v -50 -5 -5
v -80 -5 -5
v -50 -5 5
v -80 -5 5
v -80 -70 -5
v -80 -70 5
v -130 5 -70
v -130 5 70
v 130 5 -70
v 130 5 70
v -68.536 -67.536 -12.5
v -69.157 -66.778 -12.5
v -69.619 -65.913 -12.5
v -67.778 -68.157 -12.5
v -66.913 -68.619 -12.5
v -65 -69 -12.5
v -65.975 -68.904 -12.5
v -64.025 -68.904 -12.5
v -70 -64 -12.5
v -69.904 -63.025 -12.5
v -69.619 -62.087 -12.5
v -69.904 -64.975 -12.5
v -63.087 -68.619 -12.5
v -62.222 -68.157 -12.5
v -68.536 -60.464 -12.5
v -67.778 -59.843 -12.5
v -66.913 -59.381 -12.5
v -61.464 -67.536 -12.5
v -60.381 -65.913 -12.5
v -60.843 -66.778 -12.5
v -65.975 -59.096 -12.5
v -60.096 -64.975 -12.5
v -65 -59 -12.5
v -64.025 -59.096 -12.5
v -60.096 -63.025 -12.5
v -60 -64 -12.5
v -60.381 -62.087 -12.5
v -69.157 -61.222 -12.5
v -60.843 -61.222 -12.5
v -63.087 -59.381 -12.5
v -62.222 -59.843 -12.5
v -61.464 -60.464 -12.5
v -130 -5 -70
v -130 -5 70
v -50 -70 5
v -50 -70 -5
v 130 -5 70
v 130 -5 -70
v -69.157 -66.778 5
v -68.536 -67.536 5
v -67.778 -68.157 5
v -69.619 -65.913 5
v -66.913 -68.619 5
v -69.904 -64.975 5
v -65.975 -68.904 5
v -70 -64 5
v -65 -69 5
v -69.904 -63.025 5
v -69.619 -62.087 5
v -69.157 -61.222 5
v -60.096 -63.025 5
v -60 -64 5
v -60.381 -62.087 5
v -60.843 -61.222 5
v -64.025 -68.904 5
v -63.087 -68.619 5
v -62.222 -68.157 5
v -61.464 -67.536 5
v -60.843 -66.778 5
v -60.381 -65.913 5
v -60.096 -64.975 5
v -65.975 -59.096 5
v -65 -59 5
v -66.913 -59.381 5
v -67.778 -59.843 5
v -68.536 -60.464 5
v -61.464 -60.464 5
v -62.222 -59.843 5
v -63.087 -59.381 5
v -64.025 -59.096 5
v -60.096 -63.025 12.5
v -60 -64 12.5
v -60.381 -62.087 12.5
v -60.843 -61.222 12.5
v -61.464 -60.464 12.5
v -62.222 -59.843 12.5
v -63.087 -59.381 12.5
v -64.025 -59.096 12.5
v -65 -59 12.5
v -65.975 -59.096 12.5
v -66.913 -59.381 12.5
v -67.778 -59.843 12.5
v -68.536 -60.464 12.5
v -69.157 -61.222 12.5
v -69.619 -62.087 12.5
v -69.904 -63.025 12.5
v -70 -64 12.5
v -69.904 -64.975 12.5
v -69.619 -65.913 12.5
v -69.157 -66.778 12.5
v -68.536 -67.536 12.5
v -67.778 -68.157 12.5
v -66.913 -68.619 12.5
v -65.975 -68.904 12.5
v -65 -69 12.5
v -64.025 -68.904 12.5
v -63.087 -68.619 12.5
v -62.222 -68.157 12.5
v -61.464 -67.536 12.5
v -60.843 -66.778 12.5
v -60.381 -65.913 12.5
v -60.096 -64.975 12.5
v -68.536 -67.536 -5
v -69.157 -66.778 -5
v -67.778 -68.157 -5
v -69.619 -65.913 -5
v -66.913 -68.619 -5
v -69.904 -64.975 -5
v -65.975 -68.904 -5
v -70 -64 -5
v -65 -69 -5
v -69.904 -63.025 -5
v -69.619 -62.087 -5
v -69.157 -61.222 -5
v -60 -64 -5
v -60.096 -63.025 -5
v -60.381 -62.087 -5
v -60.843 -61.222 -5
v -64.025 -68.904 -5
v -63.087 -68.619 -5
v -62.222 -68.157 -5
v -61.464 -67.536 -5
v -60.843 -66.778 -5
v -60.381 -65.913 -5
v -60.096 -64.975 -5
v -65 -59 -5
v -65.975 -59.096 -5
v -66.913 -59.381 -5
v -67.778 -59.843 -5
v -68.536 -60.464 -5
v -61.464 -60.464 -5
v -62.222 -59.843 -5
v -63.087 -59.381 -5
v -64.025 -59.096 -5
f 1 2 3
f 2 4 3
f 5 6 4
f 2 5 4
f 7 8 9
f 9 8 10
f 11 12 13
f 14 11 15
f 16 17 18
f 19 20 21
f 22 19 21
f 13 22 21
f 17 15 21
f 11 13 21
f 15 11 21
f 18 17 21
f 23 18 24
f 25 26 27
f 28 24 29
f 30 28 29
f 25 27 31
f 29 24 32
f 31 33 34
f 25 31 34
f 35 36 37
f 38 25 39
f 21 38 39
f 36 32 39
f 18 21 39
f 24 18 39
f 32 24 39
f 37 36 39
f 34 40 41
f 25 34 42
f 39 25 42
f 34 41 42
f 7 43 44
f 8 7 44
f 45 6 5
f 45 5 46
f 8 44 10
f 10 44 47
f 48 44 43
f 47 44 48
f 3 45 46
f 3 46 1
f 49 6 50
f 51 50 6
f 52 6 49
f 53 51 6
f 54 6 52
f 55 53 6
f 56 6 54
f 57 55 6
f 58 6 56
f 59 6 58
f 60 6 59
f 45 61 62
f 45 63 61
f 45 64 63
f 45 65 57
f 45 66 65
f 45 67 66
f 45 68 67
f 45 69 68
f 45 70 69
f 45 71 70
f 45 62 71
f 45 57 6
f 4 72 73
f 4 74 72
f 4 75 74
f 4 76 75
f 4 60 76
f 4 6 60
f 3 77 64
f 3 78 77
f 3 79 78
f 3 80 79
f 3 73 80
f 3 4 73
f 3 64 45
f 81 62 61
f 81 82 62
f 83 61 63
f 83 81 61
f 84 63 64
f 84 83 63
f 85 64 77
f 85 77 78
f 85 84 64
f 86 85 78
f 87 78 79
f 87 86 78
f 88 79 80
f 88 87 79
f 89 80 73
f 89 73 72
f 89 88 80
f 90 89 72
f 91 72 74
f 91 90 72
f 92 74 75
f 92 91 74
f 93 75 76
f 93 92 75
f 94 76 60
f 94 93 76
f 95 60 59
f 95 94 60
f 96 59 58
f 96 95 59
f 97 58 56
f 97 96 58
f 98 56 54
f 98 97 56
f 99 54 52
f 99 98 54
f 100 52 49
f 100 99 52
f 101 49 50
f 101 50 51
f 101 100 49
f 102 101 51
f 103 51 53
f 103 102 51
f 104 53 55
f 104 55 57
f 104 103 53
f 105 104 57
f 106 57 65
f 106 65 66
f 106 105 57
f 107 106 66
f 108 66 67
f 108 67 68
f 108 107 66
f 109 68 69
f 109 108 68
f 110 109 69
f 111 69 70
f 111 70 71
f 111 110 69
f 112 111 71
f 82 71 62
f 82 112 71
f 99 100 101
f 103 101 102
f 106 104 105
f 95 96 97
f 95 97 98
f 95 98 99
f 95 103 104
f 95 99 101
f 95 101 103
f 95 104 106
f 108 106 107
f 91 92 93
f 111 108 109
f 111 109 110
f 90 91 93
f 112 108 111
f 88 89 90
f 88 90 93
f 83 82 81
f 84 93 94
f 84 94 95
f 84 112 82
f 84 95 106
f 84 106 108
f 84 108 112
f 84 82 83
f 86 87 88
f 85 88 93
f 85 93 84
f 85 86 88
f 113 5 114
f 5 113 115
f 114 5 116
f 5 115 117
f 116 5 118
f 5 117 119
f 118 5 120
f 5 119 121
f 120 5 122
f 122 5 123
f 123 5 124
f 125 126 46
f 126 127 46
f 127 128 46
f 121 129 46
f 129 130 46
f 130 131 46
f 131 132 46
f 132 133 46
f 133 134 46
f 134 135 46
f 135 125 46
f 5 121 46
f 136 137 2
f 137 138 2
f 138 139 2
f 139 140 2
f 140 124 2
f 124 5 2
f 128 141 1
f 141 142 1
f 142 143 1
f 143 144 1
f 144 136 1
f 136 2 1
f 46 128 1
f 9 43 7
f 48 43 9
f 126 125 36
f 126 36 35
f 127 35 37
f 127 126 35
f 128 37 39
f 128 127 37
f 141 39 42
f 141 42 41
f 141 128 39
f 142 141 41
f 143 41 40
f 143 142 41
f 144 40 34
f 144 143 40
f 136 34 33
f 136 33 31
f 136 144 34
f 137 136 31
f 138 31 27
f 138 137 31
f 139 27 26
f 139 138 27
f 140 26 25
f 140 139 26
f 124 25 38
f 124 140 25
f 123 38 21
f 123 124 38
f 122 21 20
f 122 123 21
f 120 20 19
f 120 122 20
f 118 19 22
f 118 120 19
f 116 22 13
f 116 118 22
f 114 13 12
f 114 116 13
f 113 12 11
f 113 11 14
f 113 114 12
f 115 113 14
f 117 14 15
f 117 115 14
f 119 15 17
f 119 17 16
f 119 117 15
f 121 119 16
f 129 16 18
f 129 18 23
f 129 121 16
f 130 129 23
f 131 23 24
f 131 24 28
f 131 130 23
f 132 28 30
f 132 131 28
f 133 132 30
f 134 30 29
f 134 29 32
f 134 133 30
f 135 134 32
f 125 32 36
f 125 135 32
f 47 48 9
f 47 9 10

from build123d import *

# Parameters (mm, degrees)
F0_W     = 260
F0_H     = 140
F1_DEPTH = 5
F2_W     = 30
F2_H     = 65
F2_R     = 5
F3_DEPTH = 5
F4_DEPTH = 12.5


with BuildPart() as f1:
    # F0 (on Front) → F1 (new body, symmetric)
    with BuildSketch(Plane.XZ):
        Rectangle(F0_W, F0_H)
    extrude(amount=F1_DEPTH, both=True)


with BuildPart() as f3:
    # F2 (on Top) → F3 (new body, symmetric)
    with BuildSketch(Plane.XY):
        with Locations((-65, -37.5)):
            Rectangle(F2_W, F2_H)
        with Locations((-65, -64)):
            Circle(F2_R, mode=Mode.SUBTRACT)
    extrude(amount=F3_DEPTH, both=True)

    # F2 (on Top) → F4 (join, symmetric)
    with BuildSketch(Plane.XY):
        with Locations((-65, -64)):
            Circle(F2_R)
    extrude(amount=F4_DEPTH, both=True)


solid = Compound([f1.part, f3.part])
